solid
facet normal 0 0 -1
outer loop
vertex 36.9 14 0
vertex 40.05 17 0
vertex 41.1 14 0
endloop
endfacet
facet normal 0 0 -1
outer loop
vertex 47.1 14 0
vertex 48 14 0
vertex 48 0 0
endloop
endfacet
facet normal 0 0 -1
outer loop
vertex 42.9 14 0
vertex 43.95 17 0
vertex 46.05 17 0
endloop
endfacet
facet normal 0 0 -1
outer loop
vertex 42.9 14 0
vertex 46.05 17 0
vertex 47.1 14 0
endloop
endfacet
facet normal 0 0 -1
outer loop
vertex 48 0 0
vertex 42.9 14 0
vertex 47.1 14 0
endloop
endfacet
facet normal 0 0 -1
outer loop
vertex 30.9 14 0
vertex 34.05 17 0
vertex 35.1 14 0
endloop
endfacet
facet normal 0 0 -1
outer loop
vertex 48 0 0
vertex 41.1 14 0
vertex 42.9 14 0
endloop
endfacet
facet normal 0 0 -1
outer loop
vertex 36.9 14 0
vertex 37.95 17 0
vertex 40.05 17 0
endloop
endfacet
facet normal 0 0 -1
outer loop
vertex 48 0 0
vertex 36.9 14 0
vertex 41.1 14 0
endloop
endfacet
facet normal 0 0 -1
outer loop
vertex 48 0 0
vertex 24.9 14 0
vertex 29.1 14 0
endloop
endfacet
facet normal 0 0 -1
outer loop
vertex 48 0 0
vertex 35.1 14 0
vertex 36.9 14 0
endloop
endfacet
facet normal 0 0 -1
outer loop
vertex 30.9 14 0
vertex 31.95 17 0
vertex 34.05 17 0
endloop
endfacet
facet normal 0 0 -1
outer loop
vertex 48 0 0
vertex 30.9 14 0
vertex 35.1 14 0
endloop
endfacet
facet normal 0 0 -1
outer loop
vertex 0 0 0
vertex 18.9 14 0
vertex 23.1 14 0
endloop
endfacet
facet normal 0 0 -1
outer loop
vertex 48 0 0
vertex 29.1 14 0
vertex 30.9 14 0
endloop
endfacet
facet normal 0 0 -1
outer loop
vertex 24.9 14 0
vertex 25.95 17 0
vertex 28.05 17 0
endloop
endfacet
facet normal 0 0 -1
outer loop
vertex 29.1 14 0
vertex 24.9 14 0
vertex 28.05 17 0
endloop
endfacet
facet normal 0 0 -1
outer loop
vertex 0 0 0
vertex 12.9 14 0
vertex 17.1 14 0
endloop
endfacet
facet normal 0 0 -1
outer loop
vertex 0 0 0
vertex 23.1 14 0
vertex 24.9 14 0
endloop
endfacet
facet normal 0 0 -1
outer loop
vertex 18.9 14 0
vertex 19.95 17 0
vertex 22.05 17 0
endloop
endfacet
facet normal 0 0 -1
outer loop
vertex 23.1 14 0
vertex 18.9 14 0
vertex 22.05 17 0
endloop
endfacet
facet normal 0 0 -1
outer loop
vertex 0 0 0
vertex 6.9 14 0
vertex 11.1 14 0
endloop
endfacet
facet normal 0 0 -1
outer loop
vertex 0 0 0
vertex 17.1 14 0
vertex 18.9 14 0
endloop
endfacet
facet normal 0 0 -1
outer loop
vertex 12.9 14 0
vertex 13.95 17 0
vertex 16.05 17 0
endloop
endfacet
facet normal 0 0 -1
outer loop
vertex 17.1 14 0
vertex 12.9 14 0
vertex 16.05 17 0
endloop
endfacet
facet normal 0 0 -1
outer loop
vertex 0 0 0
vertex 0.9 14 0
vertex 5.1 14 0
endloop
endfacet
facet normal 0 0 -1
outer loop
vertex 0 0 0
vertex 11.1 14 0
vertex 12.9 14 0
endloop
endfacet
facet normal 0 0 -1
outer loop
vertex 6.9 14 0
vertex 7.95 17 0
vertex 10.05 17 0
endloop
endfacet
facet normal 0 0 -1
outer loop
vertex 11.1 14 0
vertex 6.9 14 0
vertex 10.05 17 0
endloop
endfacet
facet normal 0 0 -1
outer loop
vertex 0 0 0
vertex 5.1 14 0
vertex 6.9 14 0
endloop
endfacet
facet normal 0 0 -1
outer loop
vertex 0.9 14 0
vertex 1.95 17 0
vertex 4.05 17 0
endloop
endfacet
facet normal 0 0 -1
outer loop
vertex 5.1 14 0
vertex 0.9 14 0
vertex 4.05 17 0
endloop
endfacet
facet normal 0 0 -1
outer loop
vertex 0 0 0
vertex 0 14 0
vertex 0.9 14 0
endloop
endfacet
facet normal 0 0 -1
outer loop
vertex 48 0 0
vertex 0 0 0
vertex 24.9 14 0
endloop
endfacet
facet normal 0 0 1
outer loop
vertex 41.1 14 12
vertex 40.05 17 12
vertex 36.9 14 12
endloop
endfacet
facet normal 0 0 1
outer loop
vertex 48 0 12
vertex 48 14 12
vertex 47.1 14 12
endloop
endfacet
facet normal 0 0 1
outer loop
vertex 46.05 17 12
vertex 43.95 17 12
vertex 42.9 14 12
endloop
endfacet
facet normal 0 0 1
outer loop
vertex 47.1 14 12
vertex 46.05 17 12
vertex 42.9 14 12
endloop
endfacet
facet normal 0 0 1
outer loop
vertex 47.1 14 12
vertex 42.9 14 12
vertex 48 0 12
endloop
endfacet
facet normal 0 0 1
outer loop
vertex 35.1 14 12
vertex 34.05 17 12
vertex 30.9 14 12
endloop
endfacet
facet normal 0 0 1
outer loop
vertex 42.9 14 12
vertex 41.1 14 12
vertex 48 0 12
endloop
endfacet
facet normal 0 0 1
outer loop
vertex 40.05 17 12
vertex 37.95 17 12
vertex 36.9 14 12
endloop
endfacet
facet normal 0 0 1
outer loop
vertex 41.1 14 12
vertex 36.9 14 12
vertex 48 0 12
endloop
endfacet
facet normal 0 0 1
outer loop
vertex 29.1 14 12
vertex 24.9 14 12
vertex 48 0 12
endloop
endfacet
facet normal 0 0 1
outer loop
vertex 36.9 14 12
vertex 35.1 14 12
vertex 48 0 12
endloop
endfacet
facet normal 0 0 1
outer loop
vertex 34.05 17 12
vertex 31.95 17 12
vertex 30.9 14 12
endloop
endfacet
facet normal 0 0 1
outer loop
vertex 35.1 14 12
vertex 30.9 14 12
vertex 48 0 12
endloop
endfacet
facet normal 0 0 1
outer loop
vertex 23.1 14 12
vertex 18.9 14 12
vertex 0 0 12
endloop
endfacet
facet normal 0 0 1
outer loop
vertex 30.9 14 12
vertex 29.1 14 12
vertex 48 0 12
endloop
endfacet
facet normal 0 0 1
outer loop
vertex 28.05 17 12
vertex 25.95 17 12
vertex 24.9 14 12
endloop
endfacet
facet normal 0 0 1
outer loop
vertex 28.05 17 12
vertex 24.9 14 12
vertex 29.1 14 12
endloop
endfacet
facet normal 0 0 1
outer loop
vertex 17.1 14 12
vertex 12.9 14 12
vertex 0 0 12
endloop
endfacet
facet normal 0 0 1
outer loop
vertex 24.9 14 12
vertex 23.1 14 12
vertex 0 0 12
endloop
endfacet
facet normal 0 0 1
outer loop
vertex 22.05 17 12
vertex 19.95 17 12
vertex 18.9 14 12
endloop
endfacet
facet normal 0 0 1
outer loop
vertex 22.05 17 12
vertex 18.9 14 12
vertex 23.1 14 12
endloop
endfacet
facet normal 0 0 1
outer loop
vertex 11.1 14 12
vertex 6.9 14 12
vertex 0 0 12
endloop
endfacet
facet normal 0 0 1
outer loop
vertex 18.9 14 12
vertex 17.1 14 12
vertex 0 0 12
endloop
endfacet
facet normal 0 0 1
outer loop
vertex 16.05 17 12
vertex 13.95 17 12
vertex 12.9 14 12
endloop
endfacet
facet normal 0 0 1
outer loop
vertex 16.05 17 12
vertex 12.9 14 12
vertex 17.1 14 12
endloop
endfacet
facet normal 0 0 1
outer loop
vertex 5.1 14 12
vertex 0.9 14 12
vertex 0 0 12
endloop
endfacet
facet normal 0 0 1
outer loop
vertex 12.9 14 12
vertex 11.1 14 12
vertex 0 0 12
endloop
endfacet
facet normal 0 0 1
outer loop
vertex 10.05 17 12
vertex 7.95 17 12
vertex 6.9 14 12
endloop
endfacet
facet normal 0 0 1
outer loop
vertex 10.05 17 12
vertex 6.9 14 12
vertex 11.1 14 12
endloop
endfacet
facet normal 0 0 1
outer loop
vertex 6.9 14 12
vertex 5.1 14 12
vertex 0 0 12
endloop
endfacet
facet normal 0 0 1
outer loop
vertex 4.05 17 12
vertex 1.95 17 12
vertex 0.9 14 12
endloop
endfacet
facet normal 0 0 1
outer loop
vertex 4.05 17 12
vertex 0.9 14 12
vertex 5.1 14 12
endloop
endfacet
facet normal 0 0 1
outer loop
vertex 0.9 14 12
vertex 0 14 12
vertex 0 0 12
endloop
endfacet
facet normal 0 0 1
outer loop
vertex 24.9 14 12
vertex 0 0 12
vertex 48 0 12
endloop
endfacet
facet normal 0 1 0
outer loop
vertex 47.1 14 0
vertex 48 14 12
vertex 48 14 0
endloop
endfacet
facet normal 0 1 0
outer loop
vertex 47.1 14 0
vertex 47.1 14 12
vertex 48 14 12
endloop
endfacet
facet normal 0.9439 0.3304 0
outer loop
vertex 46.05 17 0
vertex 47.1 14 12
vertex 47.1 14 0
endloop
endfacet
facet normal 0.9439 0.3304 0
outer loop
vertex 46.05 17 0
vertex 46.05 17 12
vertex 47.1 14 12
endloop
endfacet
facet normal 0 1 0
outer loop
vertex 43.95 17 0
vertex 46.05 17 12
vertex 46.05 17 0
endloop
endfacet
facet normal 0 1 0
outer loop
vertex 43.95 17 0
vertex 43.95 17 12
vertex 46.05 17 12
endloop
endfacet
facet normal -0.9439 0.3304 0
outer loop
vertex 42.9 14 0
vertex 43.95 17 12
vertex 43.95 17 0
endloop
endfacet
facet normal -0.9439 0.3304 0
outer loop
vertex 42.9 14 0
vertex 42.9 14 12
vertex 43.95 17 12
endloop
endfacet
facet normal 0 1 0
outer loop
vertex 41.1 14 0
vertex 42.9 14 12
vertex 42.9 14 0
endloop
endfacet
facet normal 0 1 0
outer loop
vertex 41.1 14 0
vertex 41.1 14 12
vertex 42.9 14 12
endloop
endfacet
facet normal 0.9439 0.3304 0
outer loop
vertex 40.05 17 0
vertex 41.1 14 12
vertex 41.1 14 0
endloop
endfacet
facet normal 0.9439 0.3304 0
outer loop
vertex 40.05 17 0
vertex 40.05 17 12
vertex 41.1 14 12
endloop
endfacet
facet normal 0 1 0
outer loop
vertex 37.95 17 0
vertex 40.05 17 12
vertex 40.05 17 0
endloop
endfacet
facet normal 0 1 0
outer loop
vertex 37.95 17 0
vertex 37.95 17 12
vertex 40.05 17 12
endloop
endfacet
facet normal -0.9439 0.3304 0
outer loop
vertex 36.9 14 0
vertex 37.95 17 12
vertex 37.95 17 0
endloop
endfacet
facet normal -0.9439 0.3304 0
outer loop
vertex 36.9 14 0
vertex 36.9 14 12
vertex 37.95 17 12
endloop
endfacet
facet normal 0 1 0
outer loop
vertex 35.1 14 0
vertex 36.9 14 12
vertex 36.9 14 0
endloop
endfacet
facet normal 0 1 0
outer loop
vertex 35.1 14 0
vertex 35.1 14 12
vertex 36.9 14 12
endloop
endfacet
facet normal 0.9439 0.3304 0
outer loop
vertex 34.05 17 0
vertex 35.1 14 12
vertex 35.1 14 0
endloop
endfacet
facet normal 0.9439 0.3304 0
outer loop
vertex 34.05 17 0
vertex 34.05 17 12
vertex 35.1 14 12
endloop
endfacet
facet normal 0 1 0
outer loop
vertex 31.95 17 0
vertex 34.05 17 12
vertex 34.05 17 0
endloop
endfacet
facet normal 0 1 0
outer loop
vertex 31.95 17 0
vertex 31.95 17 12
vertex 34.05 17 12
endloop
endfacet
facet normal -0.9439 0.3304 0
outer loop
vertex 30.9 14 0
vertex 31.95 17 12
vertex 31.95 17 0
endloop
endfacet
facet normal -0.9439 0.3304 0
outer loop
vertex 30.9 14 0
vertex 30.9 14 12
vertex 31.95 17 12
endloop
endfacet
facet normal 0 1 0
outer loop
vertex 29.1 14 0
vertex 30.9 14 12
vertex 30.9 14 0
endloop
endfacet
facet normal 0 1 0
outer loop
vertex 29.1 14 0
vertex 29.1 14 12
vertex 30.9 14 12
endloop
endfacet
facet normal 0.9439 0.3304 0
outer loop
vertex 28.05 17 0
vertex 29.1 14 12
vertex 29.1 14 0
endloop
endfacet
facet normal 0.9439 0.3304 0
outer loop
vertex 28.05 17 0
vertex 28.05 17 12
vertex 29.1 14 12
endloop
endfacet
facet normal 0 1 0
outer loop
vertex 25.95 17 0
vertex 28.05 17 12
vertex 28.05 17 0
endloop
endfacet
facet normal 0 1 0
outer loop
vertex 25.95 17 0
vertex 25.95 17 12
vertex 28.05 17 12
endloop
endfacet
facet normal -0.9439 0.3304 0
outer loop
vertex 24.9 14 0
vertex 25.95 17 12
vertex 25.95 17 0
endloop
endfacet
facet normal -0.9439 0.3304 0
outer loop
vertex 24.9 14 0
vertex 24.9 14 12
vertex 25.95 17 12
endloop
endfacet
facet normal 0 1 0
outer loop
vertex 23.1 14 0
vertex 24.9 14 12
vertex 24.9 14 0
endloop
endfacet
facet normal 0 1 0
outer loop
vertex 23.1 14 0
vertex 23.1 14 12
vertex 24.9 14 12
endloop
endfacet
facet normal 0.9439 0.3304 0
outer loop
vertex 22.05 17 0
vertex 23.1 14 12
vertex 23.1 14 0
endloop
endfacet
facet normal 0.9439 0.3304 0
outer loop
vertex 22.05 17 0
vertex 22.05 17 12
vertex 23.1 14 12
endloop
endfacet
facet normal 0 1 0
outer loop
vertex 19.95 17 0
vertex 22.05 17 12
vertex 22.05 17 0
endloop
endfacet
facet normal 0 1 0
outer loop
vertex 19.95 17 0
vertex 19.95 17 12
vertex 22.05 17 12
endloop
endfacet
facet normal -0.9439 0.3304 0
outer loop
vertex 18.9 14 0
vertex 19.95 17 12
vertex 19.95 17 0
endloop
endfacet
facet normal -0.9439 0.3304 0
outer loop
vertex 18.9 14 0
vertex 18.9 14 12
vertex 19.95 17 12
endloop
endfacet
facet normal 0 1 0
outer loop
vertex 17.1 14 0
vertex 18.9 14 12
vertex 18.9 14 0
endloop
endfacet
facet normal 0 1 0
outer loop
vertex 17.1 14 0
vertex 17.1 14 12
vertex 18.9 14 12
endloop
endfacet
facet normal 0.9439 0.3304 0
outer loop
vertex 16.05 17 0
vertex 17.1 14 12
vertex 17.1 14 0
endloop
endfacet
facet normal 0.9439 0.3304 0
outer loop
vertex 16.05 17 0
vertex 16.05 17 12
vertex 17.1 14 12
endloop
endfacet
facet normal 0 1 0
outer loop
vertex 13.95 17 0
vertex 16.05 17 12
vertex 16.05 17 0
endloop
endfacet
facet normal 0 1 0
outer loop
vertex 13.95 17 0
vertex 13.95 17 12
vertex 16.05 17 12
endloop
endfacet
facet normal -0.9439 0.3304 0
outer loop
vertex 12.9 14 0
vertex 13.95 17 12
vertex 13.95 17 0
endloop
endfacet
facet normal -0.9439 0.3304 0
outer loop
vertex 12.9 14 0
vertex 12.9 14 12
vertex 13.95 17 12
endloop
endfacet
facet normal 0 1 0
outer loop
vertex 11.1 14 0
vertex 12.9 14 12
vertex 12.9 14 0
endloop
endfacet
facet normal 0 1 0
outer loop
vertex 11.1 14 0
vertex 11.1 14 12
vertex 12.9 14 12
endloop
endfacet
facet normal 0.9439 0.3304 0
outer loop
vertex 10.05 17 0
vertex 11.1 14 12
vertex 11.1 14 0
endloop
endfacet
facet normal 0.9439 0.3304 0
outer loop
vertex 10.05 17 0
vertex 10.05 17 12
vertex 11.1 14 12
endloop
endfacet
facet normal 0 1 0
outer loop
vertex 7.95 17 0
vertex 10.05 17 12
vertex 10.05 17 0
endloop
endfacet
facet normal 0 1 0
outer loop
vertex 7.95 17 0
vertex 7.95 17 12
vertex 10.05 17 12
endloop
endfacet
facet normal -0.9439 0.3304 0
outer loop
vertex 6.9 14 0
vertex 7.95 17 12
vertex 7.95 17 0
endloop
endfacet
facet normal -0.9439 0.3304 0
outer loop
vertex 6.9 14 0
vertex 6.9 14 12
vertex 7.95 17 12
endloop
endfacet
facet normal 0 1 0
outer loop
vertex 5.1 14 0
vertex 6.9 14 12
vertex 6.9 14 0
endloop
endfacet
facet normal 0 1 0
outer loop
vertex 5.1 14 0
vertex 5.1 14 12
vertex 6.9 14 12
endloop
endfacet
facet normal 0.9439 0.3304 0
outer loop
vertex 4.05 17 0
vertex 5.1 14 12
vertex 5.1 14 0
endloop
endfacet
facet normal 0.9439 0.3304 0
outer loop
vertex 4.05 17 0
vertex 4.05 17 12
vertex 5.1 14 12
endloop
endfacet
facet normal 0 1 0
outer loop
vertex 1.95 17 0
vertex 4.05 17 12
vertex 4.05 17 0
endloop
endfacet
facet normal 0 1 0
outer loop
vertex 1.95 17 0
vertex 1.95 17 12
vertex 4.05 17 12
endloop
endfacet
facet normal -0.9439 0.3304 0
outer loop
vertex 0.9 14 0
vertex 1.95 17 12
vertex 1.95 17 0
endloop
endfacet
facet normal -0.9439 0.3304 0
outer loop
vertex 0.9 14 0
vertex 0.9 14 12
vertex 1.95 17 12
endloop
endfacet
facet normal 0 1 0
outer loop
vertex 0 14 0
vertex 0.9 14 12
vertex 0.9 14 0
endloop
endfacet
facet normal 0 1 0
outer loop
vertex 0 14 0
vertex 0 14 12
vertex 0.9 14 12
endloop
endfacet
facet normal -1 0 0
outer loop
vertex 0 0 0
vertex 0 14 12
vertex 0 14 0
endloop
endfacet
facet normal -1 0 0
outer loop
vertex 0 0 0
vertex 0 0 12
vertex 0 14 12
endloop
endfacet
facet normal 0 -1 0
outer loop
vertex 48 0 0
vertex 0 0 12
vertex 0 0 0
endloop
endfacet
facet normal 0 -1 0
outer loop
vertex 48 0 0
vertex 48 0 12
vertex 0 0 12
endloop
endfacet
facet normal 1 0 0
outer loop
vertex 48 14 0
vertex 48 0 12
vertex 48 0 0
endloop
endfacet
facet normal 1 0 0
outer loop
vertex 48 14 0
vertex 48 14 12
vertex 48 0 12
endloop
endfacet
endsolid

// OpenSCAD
$fn = 32;

// ----------------------------------------------------------------------
// Gear rack: 8 teeth, pitch 6 mm
// ----------------------------------------------------------------------

// --- parameters (mm) ---
teeth = 8;                // number of teeth
pitch = 6;                // tooth pitch, X
root_w = 4.2;             // tooth width at the root
tip_w = 2.1;              // tooth width at the tip
base_h = 14;              // rack body height, Y
tooth_h = 3;              // tooth height above the body
plate_t = 12;             // rack width, Z (extrusion height)

rack_l = teeth * pitch;  // overall length
total_h = base_h + tooth_h;  // overall height

profile = [[0, 0], [48, 0], [48, 14], [47.1, 14], [46.05, 17], [43.95, 17], [42.9, 14], [41.1, 14], [40.05, 17], [37.95, 17], [36.9, 14], [35.1, 14], [34.05, 17], [31.95, 17], [30.9, 14], [29.1, 14], [28.05, 17], [25.95, 17], [24.9, 14], [23.1, 14], [22.05, 17], [19.95, 17], [18.9, 14], [17.1, 14], [16.05, 17], [13.95, 17], [12.9, 14], [11.1, 14], [10.05, 17], [7.95, 17], [6.9, 14], [5.1, 14], [4.05, 17], [1.95, 17], [0.9, 14], [0, 14]];  // primary outline, 36 points, counter clockwise

// --- the one profile operation ---
linear_extrude(height = plate_t) polygon(points = profile);
